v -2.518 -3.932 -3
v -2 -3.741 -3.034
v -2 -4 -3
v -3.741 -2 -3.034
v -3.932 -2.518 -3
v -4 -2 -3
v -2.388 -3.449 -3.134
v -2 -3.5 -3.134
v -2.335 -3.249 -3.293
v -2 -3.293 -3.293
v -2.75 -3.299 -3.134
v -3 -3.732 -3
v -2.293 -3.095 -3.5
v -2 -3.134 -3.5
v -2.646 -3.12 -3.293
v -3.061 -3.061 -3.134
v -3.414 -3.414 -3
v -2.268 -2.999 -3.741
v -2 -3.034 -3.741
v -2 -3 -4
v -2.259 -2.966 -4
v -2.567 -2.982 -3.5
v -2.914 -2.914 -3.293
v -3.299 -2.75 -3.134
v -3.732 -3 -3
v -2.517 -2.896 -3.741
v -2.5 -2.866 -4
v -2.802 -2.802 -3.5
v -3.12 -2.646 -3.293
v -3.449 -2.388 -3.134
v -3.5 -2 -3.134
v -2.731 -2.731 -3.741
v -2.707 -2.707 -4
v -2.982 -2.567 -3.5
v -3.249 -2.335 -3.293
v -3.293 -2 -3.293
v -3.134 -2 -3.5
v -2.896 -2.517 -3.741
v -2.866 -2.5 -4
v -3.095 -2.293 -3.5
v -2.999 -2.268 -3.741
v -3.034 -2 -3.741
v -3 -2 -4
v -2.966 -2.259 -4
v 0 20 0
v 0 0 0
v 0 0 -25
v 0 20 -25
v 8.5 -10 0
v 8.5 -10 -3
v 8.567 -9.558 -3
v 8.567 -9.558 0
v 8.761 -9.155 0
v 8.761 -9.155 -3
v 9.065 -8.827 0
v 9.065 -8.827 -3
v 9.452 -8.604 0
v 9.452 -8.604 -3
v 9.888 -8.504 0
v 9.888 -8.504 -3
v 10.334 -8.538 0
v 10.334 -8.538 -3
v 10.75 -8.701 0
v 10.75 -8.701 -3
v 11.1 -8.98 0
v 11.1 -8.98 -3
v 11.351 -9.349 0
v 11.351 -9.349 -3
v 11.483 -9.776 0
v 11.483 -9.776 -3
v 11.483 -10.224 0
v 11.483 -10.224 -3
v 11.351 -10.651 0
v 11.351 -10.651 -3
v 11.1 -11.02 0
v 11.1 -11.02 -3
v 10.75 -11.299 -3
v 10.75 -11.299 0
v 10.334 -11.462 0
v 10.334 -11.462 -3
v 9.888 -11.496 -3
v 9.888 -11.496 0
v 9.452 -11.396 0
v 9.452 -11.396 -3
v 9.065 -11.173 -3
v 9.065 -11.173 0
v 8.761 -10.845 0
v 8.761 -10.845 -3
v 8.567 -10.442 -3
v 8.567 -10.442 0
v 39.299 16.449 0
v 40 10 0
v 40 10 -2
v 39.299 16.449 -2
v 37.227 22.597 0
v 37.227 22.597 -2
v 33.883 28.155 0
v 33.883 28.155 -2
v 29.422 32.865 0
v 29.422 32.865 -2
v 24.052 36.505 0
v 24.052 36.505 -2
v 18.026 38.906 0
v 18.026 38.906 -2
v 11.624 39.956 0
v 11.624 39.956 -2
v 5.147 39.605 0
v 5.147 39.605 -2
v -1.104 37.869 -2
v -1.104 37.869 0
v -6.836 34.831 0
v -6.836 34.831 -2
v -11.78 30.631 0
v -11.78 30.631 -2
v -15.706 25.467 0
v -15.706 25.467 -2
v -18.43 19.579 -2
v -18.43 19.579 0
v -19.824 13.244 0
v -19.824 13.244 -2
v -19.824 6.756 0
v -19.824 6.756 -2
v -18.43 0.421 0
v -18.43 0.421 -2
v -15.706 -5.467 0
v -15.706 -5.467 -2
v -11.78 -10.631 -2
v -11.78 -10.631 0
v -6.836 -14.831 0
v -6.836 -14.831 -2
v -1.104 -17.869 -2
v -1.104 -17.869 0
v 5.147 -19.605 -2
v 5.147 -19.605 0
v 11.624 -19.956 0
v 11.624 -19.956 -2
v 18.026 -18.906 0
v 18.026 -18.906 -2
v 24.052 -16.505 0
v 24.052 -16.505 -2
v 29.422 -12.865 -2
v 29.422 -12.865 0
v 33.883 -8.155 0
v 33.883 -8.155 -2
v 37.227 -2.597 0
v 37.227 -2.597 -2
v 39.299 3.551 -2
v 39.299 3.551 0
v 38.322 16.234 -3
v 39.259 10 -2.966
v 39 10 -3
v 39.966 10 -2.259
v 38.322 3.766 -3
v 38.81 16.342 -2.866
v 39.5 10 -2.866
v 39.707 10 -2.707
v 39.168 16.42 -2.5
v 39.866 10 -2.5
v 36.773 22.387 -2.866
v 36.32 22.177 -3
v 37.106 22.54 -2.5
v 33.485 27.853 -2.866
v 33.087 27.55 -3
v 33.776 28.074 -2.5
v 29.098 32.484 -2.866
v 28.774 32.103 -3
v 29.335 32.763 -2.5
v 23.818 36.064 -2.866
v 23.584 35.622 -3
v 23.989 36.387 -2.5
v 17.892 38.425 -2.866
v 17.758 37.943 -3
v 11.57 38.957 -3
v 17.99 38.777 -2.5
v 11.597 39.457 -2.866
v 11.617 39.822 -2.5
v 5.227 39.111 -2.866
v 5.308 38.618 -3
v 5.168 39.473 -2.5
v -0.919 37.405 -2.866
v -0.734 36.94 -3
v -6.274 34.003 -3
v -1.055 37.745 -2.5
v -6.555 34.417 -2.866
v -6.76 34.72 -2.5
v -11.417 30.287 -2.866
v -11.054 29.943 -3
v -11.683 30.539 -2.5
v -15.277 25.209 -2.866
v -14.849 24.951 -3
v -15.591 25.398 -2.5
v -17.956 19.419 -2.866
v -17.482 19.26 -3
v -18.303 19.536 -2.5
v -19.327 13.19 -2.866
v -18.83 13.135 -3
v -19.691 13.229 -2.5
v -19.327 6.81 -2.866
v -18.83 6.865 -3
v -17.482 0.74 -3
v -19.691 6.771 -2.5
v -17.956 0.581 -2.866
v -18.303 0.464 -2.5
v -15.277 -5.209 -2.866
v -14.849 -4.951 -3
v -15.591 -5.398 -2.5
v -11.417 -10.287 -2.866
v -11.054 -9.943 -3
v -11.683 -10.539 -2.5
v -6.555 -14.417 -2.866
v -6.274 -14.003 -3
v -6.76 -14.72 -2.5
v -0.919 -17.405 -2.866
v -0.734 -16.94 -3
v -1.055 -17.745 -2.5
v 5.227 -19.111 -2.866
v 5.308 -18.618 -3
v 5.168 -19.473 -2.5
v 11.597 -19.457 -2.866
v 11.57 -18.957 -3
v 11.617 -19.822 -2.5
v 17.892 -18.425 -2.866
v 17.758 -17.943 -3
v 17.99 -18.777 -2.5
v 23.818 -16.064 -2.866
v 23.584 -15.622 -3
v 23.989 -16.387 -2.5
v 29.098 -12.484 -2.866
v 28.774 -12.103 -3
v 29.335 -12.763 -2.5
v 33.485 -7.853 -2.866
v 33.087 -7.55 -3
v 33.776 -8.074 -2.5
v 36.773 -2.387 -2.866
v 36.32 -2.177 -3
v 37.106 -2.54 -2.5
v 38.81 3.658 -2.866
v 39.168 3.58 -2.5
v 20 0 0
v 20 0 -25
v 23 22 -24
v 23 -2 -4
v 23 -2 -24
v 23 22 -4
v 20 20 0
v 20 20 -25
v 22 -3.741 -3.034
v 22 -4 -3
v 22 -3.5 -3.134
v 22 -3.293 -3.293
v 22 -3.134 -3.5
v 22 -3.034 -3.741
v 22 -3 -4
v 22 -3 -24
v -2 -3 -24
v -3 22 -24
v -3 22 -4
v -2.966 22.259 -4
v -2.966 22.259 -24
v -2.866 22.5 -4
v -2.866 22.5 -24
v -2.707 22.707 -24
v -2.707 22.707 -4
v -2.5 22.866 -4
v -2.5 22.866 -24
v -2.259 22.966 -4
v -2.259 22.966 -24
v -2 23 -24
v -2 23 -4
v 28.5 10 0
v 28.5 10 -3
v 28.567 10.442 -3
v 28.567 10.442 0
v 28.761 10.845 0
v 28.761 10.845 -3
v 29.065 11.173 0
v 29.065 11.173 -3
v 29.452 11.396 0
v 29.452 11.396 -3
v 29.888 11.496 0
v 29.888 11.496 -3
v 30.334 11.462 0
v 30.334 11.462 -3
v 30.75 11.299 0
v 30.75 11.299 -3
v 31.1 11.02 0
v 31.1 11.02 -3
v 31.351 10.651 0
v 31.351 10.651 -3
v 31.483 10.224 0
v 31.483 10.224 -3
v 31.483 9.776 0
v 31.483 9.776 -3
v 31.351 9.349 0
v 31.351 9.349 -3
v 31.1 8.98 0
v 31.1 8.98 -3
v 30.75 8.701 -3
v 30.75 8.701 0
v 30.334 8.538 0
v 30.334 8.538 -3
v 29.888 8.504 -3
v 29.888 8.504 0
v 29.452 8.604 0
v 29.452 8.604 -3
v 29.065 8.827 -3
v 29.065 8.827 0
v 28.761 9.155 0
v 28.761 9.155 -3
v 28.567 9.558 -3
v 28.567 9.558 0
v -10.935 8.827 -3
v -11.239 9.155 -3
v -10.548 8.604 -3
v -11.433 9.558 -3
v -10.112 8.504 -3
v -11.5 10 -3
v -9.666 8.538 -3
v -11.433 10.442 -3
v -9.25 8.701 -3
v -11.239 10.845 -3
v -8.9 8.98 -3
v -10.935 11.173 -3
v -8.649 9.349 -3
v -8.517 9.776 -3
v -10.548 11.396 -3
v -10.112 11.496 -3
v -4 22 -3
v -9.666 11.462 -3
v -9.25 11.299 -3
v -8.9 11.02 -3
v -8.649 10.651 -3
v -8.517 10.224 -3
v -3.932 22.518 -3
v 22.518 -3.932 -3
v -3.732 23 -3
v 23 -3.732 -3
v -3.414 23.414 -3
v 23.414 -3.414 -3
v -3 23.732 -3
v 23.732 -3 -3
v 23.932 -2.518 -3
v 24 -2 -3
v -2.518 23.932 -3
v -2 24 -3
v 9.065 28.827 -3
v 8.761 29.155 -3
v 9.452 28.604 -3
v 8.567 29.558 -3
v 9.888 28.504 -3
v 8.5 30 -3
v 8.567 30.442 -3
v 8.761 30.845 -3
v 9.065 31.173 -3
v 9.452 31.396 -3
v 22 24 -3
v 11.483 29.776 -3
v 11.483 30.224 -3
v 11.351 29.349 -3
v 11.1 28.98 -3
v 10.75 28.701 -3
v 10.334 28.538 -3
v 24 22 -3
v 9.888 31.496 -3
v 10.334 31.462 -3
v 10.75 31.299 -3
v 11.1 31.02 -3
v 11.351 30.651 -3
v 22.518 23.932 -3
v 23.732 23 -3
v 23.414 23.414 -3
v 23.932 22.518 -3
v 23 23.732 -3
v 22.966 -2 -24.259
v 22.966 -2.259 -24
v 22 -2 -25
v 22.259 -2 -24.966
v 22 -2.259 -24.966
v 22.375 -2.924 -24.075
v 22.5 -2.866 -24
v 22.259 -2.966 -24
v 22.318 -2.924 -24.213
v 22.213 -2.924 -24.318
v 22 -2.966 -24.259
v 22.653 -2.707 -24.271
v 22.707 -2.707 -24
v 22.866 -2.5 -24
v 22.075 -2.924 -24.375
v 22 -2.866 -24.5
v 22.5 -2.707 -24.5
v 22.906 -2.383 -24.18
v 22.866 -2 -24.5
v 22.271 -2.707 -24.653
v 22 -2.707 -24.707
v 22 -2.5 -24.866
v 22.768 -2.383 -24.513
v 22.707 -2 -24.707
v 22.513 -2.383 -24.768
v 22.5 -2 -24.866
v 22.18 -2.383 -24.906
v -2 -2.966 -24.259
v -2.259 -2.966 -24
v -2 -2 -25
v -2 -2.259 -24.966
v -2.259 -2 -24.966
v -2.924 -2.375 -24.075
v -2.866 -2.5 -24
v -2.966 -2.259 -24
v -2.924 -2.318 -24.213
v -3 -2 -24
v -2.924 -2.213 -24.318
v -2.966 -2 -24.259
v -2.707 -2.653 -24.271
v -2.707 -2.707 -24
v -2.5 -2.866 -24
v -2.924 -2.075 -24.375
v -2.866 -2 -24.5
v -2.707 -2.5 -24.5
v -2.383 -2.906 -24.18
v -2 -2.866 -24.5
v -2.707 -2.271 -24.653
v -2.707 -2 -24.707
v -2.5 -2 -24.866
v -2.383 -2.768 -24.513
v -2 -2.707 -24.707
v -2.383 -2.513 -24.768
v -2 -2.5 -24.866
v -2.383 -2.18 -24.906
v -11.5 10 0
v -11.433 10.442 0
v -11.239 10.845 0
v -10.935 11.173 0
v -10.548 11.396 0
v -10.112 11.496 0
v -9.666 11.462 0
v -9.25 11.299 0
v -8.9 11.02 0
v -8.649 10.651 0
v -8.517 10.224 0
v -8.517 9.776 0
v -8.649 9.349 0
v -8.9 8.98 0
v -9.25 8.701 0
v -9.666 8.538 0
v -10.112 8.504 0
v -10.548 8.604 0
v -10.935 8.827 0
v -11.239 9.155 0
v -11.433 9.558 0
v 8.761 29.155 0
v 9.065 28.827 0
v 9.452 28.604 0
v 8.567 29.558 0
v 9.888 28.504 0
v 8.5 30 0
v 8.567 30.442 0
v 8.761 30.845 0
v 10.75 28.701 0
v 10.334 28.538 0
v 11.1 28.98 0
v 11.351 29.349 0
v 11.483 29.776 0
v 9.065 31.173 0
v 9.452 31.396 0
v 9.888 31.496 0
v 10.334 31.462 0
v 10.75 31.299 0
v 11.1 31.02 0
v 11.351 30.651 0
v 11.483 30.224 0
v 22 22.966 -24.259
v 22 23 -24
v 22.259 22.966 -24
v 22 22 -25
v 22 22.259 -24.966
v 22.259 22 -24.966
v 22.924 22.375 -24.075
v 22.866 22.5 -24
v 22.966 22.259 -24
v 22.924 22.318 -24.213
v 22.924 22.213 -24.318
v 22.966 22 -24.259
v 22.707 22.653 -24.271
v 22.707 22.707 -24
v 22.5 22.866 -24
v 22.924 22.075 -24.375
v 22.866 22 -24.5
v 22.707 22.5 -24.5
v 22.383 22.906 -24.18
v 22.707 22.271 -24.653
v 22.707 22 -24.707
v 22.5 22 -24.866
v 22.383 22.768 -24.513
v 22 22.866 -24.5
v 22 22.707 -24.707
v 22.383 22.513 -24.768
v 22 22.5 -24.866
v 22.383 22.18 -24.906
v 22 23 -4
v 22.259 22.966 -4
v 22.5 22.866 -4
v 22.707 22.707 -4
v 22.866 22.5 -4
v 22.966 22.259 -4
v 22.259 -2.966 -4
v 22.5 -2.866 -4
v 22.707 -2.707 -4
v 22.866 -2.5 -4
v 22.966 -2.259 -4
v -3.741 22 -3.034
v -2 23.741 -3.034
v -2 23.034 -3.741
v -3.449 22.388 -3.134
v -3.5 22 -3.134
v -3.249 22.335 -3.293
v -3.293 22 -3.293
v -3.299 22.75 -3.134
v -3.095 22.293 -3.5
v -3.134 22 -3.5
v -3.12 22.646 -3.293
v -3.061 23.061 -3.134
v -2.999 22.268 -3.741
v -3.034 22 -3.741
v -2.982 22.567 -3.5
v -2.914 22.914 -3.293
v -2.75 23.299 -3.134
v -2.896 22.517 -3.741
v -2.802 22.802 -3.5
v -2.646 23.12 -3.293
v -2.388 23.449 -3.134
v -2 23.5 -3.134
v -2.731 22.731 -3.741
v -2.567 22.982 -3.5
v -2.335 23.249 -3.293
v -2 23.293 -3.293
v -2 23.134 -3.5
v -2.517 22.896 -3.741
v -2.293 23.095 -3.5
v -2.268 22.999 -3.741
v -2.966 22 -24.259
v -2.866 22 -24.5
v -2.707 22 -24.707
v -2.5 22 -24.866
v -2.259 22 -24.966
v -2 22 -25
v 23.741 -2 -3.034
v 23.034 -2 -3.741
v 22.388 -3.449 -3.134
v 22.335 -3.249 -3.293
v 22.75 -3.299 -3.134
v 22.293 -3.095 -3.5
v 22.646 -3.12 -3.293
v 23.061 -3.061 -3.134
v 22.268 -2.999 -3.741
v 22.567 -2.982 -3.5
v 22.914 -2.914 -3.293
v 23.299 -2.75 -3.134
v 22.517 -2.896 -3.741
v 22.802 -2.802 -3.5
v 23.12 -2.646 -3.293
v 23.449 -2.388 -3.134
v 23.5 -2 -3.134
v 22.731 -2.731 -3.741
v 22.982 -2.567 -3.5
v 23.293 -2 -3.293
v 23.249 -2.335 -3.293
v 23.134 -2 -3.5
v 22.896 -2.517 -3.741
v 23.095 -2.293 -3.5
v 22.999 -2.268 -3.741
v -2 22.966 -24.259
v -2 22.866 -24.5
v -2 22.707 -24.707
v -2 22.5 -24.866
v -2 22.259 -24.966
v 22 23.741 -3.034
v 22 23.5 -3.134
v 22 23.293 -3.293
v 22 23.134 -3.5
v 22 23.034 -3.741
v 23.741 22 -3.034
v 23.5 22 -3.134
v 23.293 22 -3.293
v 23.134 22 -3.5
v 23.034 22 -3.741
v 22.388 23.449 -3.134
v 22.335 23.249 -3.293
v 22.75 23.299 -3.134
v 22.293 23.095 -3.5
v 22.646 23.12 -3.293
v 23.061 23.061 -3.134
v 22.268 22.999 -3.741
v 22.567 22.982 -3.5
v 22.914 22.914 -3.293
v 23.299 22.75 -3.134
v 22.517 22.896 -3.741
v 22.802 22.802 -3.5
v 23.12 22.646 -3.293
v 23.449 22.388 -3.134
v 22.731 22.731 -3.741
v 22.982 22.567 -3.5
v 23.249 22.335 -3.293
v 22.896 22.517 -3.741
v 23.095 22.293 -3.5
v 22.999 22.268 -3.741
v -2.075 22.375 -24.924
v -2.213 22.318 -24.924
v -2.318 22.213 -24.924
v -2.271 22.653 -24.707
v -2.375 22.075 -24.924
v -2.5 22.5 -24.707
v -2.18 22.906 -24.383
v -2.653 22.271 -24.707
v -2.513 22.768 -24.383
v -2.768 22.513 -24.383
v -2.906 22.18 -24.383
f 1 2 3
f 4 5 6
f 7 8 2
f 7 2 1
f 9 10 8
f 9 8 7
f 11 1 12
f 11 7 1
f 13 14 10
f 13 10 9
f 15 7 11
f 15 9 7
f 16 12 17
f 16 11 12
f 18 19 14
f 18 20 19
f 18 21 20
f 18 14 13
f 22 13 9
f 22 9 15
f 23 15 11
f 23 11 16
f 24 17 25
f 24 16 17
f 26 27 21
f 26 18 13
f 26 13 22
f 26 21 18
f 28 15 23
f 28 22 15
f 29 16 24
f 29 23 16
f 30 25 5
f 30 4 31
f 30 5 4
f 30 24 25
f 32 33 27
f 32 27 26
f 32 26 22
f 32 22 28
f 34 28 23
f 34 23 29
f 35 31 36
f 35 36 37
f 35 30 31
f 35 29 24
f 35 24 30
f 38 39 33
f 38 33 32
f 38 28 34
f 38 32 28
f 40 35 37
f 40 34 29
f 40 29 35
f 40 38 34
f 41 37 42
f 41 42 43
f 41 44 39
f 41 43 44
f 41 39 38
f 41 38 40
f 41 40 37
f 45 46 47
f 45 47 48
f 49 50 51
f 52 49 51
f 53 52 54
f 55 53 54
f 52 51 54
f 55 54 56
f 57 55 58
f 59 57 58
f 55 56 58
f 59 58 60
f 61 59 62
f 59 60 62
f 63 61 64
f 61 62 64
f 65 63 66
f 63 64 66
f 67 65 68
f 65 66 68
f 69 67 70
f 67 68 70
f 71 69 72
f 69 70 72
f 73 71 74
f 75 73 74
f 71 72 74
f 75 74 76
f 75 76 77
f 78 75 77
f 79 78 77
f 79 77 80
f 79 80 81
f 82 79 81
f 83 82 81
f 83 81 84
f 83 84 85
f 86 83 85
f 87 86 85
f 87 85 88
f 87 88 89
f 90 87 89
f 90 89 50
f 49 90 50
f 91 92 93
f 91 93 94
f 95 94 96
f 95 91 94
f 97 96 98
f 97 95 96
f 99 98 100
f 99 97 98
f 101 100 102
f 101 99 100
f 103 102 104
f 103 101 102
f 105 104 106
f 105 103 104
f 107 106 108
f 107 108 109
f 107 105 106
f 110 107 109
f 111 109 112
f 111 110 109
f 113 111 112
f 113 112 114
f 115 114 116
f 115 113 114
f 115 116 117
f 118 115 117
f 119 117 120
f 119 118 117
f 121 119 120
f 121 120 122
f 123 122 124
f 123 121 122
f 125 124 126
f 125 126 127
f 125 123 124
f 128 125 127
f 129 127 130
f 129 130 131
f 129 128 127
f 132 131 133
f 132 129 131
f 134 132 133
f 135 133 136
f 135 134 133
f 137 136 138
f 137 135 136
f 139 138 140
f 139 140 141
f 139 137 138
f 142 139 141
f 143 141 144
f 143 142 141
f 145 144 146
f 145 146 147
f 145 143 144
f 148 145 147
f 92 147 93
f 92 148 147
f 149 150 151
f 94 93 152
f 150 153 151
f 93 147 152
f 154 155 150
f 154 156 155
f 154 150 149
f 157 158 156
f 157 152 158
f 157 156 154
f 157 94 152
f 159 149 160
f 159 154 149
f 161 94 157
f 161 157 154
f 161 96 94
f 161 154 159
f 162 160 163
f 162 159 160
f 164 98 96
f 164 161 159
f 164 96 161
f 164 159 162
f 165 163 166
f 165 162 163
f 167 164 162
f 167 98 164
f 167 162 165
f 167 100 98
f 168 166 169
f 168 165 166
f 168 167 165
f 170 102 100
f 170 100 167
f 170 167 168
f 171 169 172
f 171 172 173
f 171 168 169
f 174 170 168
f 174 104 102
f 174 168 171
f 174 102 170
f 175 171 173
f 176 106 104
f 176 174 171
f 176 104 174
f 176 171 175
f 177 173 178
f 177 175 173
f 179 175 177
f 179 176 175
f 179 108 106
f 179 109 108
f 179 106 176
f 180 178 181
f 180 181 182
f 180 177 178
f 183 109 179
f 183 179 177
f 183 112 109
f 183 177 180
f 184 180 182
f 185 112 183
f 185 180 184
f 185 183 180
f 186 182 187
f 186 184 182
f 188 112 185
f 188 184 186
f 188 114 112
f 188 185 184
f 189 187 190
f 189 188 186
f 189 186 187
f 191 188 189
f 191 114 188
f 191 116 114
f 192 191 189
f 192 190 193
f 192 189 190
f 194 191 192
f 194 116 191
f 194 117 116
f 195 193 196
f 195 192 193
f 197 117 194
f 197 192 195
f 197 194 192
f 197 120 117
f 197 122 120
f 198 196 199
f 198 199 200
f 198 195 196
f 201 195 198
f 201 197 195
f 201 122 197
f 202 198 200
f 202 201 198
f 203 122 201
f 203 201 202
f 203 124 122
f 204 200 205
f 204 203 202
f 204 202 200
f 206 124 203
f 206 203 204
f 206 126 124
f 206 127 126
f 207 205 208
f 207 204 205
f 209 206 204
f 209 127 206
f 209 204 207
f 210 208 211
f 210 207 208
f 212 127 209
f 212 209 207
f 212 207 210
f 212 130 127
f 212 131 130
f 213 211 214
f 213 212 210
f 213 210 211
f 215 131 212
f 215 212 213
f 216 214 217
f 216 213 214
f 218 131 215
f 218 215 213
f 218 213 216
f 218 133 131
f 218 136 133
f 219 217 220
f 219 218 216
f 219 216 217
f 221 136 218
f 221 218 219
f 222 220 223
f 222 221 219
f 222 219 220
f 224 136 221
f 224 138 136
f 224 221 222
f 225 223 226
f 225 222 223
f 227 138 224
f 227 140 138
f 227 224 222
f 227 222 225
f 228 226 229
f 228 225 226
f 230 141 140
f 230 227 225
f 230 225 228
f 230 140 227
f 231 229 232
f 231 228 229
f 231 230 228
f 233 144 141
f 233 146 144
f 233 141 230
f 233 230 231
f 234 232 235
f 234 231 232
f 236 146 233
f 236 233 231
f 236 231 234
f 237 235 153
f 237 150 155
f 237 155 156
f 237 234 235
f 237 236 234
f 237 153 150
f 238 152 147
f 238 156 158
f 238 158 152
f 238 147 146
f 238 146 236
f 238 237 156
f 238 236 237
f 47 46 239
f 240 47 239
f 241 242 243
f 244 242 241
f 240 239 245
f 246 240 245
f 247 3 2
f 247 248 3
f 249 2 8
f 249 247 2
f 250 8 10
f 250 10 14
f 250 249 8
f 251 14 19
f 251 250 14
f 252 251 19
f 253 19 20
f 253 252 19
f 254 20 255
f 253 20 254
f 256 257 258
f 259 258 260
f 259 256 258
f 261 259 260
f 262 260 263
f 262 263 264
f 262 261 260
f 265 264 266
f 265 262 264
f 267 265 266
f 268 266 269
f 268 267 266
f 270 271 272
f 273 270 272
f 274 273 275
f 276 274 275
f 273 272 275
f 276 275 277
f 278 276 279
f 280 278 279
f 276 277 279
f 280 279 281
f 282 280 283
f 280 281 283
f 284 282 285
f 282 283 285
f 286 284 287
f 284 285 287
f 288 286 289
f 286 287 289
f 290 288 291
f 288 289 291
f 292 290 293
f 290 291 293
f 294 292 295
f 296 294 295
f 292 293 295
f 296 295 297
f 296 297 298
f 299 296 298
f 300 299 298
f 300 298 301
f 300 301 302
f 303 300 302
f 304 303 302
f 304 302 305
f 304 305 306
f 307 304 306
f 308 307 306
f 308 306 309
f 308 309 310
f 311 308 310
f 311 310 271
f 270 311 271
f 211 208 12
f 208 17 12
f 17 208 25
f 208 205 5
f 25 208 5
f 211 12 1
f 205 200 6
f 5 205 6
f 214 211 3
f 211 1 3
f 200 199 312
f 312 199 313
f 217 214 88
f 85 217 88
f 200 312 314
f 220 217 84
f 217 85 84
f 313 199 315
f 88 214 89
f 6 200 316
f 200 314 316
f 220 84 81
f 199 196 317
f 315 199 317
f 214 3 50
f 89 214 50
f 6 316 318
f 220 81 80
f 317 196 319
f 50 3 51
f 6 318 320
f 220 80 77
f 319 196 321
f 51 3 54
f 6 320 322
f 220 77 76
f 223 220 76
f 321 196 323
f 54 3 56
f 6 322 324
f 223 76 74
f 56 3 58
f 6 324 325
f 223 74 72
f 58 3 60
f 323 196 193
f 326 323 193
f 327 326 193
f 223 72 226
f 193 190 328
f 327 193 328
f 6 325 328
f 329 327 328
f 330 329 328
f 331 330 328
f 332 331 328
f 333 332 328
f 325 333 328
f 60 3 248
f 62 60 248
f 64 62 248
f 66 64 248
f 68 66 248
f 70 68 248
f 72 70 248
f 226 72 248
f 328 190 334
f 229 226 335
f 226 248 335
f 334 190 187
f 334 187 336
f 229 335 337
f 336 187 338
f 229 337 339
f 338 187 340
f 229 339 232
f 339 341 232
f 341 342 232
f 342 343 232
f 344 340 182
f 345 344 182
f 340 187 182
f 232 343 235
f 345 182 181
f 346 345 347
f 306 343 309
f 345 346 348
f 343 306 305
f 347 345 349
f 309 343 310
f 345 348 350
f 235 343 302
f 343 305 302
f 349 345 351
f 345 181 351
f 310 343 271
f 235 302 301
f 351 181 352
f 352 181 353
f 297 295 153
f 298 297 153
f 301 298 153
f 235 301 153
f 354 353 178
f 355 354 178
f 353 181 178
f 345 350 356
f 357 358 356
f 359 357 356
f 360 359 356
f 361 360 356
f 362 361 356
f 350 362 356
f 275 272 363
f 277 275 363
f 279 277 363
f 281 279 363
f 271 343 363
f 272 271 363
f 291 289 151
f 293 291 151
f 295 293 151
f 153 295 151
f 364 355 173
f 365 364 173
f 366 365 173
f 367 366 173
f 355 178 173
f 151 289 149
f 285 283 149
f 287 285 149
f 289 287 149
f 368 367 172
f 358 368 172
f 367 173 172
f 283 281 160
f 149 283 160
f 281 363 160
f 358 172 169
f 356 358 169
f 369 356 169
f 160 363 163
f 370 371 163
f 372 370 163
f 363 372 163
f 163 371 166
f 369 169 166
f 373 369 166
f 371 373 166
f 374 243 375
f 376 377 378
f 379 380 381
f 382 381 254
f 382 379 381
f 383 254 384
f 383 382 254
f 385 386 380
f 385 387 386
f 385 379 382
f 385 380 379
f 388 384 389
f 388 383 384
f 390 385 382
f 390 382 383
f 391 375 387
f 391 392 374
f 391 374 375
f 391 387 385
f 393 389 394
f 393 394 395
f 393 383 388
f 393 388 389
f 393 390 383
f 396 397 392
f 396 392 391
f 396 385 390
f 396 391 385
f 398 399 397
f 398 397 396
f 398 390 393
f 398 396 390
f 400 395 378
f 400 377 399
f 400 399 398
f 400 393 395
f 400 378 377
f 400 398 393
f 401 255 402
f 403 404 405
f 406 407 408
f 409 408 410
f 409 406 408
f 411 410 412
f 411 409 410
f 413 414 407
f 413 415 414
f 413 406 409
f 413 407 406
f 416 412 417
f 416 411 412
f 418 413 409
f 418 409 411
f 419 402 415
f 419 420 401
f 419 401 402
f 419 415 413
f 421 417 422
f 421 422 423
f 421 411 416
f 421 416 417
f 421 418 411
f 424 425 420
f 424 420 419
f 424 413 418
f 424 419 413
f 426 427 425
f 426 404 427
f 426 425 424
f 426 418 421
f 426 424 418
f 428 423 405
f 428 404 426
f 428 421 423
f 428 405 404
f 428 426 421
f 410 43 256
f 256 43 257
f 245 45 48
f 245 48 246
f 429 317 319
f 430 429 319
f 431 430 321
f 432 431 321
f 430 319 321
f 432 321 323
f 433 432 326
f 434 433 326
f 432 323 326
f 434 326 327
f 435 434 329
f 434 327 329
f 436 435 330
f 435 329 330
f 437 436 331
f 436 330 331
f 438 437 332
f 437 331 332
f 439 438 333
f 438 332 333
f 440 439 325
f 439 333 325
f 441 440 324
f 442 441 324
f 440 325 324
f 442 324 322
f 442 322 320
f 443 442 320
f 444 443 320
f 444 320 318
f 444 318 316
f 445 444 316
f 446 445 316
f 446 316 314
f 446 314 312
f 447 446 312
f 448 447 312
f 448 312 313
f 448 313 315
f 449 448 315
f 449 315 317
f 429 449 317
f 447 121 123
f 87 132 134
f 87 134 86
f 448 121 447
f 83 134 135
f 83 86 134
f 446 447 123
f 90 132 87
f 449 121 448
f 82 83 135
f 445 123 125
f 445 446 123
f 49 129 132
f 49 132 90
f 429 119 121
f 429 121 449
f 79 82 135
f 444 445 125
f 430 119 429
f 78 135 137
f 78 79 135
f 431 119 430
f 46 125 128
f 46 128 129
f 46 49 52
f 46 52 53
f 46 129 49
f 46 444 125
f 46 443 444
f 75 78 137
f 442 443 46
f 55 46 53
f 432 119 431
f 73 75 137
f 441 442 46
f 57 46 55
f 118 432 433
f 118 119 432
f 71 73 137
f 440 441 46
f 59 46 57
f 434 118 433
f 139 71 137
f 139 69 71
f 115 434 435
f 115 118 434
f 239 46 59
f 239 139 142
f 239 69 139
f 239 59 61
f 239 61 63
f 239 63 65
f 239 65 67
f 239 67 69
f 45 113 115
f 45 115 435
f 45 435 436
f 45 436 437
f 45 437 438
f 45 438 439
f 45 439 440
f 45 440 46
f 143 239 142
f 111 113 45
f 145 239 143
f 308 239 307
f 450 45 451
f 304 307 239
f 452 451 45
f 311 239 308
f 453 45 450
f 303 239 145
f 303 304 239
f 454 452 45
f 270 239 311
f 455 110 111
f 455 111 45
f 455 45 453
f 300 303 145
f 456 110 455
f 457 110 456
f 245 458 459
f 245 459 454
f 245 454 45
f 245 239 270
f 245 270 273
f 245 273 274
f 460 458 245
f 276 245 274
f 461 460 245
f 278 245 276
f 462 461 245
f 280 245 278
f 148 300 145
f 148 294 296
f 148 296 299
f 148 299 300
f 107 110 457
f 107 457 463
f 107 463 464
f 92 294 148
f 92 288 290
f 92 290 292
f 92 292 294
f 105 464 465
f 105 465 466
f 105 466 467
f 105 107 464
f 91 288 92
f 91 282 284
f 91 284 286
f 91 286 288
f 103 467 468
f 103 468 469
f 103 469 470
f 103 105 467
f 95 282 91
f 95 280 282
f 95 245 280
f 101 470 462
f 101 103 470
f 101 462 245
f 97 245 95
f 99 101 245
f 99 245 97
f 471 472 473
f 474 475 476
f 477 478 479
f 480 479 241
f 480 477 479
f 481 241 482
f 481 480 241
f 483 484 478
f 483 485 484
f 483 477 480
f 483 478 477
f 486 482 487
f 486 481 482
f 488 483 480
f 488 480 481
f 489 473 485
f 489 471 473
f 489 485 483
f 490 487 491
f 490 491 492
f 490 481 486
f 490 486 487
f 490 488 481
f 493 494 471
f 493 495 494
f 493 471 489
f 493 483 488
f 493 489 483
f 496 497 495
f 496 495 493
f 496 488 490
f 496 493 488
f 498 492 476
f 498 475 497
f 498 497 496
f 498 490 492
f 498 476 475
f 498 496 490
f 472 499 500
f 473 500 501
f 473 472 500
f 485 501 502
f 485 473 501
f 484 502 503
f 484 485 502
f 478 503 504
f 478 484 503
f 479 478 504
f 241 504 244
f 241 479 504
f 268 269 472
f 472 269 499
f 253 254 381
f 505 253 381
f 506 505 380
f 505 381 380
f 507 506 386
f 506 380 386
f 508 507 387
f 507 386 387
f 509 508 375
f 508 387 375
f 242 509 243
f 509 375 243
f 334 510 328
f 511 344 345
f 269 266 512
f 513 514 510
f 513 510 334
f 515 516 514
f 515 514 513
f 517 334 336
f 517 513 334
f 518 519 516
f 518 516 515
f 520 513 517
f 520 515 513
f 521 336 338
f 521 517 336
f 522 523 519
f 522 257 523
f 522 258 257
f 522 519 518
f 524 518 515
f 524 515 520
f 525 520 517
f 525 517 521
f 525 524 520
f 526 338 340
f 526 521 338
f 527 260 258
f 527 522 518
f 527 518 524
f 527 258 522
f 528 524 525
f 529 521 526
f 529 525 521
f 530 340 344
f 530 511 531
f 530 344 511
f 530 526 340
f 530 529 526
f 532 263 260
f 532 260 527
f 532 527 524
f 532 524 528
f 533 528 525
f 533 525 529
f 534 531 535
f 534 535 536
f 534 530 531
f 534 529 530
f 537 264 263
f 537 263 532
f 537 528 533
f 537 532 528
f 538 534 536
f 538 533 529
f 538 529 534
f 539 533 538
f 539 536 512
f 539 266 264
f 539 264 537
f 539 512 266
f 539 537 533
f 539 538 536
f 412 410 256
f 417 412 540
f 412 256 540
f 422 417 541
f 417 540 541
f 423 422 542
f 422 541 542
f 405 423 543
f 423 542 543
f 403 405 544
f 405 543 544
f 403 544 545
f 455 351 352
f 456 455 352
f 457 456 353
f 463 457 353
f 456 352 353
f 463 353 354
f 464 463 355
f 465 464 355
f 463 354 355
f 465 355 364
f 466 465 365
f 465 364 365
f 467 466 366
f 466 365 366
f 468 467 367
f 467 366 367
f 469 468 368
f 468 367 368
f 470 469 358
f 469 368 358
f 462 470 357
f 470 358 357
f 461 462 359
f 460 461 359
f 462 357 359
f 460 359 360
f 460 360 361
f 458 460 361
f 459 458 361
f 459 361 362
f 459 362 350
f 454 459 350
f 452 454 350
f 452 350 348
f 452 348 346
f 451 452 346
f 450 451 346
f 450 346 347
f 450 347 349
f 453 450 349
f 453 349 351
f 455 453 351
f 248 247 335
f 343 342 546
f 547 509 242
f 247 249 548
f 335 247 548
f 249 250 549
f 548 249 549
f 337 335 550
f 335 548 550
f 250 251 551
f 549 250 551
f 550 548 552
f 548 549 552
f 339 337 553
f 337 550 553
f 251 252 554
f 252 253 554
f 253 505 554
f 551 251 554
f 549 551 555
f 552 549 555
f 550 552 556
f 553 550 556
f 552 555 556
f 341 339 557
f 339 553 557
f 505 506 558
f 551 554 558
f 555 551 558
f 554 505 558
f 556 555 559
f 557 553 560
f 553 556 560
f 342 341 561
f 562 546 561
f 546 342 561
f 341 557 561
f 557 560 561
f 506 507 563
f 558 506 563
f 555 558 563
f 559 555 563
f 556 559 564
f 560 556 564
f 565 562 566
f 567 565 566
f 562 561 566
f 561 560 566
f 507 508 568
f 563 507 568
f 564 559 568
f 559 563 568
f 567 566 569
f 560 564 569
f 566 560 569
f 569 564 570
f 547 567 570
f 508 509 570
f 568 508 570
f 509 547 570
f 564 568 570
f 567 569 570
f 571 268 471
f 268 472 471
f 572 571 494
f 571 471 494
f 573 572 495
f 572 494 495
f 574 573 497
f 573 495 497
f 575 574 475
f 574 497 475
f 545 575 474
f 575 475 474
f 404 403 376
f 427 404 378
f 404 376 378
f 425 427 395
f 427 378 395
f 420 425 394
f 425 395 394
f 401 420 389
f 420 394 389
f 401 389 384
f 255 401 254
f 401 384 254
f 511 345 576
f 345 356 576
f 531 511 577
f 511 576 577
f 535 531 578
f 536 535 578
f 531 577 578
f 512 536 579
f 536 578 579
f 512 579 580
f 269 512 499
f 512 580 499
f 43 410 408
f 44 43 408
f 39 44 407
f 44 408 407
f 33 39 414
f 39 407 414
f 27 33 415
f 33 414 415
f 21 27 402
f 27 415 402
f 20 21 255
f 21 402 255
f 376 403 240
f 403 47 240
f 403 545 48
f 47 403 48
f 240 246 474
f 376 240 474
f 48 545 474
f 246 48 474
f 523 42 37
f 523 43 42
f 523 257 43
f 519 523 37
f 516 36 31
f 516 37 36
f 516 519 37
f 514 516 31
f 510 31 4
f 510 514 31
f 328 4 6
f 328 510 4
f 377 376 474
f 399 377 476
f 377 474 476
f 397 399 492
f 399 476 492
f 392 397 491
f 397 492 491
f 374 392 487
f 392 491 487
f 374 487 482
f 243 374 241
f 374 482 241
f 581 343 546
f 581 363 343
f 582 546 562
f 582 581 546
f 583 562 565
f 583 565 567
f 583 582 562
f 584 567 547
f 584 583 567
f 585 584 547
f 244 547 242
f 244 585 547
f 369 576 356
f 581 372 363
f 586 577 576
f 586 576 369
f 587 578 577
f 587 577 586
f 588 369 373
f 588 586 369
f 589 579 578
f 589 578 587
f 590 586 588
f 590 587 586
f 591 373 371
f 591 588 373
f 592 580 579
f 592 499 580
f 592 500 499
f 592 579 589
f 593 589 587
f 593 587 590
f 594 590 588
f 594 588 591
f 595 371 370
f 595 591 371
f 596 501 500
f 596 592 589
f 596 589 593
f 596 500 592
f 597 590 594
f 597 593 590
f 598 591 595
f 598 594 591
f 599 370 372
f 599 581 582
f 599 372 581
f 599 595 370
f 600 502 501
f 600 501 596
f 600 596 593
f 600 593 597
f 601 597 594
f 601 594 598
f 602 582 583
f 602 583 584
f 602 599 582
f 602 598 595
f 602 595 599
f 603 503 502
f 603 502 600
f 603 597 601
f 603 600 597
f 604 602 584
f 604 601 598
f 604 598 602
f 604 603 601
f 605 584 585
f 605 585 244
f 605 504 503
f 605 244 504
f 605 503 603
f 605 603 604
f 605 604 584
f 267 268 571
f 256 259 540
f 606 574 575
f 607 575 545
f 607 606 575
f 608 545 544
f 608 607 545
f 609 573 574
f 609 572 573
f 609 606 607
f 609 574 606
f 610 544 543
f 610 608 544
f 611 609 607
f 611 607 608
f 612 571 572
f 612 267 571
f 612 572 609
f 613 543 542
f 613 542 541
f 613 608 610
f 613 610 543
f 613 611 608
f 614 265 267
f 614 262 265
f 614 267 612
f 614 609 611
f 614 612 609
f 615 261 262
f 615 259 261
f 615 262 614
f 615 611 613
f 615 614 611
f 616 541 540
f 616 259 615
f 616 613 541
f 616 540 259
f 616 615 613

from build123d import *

# Parameters (mm, degrees)
F0_R     = 30
F0_W     = 26
F0_H     = 26
F1_DEPTH = 3
F0_W_2   = 20
F0_H_2   = 20
F2_DEPTH = 25
F3_R     = 1
F5_D     = 3


with BuildPart() as f1:
    # F0 (on Top) → F1 (new body)
    with BuildSketch(Plane.XY):
        with Locations((10, 10)):
            Circle(F0_R)
        with Locations((10, 10)):
            Rectangle(F0_W, F0_H, mode=Mode.SUBTRACT)
    extrude(amount=-F1_DEPTH)

    # F0 (on Top) → F2 (join)
    with BuildSketch(Plane.XY):
        with Locations((10, 10)):
            Rectangle(F0_W, F0_H)
        with Locations((10, 10)):
            Rectangle(F0_W_2, F0_H_2, mode=Mode.SUBTRACT)
    extrude(amount=-F2_DEPTH)

    # F3
    f3_edges = [f1.edges().sort_by_distance(p)[0] for p in [
        (-20, 10, -3),
        (10, -3, -3),
        (-3, 10, -3),
        (10, 23, -3),
        (23, 10, -3),
        (-3, 23, -14),
        (10, 23, -25),
        (23, 23, -14),
        (23, 10, -25),
        (23, -3, -14),
        (10, -3, -25),
        (-3, -3, -14),
        (-3, 10, -25),
    ]]
    fillet(f3_edges, radius=F3_R)

    # F5 (through all)
    with Locations(Plane.XY):
        with Locations((10, 30), (30, 10), (10, -10), (-10, 10)):
            Hole(F5_D / 2)


solid = f1.part
